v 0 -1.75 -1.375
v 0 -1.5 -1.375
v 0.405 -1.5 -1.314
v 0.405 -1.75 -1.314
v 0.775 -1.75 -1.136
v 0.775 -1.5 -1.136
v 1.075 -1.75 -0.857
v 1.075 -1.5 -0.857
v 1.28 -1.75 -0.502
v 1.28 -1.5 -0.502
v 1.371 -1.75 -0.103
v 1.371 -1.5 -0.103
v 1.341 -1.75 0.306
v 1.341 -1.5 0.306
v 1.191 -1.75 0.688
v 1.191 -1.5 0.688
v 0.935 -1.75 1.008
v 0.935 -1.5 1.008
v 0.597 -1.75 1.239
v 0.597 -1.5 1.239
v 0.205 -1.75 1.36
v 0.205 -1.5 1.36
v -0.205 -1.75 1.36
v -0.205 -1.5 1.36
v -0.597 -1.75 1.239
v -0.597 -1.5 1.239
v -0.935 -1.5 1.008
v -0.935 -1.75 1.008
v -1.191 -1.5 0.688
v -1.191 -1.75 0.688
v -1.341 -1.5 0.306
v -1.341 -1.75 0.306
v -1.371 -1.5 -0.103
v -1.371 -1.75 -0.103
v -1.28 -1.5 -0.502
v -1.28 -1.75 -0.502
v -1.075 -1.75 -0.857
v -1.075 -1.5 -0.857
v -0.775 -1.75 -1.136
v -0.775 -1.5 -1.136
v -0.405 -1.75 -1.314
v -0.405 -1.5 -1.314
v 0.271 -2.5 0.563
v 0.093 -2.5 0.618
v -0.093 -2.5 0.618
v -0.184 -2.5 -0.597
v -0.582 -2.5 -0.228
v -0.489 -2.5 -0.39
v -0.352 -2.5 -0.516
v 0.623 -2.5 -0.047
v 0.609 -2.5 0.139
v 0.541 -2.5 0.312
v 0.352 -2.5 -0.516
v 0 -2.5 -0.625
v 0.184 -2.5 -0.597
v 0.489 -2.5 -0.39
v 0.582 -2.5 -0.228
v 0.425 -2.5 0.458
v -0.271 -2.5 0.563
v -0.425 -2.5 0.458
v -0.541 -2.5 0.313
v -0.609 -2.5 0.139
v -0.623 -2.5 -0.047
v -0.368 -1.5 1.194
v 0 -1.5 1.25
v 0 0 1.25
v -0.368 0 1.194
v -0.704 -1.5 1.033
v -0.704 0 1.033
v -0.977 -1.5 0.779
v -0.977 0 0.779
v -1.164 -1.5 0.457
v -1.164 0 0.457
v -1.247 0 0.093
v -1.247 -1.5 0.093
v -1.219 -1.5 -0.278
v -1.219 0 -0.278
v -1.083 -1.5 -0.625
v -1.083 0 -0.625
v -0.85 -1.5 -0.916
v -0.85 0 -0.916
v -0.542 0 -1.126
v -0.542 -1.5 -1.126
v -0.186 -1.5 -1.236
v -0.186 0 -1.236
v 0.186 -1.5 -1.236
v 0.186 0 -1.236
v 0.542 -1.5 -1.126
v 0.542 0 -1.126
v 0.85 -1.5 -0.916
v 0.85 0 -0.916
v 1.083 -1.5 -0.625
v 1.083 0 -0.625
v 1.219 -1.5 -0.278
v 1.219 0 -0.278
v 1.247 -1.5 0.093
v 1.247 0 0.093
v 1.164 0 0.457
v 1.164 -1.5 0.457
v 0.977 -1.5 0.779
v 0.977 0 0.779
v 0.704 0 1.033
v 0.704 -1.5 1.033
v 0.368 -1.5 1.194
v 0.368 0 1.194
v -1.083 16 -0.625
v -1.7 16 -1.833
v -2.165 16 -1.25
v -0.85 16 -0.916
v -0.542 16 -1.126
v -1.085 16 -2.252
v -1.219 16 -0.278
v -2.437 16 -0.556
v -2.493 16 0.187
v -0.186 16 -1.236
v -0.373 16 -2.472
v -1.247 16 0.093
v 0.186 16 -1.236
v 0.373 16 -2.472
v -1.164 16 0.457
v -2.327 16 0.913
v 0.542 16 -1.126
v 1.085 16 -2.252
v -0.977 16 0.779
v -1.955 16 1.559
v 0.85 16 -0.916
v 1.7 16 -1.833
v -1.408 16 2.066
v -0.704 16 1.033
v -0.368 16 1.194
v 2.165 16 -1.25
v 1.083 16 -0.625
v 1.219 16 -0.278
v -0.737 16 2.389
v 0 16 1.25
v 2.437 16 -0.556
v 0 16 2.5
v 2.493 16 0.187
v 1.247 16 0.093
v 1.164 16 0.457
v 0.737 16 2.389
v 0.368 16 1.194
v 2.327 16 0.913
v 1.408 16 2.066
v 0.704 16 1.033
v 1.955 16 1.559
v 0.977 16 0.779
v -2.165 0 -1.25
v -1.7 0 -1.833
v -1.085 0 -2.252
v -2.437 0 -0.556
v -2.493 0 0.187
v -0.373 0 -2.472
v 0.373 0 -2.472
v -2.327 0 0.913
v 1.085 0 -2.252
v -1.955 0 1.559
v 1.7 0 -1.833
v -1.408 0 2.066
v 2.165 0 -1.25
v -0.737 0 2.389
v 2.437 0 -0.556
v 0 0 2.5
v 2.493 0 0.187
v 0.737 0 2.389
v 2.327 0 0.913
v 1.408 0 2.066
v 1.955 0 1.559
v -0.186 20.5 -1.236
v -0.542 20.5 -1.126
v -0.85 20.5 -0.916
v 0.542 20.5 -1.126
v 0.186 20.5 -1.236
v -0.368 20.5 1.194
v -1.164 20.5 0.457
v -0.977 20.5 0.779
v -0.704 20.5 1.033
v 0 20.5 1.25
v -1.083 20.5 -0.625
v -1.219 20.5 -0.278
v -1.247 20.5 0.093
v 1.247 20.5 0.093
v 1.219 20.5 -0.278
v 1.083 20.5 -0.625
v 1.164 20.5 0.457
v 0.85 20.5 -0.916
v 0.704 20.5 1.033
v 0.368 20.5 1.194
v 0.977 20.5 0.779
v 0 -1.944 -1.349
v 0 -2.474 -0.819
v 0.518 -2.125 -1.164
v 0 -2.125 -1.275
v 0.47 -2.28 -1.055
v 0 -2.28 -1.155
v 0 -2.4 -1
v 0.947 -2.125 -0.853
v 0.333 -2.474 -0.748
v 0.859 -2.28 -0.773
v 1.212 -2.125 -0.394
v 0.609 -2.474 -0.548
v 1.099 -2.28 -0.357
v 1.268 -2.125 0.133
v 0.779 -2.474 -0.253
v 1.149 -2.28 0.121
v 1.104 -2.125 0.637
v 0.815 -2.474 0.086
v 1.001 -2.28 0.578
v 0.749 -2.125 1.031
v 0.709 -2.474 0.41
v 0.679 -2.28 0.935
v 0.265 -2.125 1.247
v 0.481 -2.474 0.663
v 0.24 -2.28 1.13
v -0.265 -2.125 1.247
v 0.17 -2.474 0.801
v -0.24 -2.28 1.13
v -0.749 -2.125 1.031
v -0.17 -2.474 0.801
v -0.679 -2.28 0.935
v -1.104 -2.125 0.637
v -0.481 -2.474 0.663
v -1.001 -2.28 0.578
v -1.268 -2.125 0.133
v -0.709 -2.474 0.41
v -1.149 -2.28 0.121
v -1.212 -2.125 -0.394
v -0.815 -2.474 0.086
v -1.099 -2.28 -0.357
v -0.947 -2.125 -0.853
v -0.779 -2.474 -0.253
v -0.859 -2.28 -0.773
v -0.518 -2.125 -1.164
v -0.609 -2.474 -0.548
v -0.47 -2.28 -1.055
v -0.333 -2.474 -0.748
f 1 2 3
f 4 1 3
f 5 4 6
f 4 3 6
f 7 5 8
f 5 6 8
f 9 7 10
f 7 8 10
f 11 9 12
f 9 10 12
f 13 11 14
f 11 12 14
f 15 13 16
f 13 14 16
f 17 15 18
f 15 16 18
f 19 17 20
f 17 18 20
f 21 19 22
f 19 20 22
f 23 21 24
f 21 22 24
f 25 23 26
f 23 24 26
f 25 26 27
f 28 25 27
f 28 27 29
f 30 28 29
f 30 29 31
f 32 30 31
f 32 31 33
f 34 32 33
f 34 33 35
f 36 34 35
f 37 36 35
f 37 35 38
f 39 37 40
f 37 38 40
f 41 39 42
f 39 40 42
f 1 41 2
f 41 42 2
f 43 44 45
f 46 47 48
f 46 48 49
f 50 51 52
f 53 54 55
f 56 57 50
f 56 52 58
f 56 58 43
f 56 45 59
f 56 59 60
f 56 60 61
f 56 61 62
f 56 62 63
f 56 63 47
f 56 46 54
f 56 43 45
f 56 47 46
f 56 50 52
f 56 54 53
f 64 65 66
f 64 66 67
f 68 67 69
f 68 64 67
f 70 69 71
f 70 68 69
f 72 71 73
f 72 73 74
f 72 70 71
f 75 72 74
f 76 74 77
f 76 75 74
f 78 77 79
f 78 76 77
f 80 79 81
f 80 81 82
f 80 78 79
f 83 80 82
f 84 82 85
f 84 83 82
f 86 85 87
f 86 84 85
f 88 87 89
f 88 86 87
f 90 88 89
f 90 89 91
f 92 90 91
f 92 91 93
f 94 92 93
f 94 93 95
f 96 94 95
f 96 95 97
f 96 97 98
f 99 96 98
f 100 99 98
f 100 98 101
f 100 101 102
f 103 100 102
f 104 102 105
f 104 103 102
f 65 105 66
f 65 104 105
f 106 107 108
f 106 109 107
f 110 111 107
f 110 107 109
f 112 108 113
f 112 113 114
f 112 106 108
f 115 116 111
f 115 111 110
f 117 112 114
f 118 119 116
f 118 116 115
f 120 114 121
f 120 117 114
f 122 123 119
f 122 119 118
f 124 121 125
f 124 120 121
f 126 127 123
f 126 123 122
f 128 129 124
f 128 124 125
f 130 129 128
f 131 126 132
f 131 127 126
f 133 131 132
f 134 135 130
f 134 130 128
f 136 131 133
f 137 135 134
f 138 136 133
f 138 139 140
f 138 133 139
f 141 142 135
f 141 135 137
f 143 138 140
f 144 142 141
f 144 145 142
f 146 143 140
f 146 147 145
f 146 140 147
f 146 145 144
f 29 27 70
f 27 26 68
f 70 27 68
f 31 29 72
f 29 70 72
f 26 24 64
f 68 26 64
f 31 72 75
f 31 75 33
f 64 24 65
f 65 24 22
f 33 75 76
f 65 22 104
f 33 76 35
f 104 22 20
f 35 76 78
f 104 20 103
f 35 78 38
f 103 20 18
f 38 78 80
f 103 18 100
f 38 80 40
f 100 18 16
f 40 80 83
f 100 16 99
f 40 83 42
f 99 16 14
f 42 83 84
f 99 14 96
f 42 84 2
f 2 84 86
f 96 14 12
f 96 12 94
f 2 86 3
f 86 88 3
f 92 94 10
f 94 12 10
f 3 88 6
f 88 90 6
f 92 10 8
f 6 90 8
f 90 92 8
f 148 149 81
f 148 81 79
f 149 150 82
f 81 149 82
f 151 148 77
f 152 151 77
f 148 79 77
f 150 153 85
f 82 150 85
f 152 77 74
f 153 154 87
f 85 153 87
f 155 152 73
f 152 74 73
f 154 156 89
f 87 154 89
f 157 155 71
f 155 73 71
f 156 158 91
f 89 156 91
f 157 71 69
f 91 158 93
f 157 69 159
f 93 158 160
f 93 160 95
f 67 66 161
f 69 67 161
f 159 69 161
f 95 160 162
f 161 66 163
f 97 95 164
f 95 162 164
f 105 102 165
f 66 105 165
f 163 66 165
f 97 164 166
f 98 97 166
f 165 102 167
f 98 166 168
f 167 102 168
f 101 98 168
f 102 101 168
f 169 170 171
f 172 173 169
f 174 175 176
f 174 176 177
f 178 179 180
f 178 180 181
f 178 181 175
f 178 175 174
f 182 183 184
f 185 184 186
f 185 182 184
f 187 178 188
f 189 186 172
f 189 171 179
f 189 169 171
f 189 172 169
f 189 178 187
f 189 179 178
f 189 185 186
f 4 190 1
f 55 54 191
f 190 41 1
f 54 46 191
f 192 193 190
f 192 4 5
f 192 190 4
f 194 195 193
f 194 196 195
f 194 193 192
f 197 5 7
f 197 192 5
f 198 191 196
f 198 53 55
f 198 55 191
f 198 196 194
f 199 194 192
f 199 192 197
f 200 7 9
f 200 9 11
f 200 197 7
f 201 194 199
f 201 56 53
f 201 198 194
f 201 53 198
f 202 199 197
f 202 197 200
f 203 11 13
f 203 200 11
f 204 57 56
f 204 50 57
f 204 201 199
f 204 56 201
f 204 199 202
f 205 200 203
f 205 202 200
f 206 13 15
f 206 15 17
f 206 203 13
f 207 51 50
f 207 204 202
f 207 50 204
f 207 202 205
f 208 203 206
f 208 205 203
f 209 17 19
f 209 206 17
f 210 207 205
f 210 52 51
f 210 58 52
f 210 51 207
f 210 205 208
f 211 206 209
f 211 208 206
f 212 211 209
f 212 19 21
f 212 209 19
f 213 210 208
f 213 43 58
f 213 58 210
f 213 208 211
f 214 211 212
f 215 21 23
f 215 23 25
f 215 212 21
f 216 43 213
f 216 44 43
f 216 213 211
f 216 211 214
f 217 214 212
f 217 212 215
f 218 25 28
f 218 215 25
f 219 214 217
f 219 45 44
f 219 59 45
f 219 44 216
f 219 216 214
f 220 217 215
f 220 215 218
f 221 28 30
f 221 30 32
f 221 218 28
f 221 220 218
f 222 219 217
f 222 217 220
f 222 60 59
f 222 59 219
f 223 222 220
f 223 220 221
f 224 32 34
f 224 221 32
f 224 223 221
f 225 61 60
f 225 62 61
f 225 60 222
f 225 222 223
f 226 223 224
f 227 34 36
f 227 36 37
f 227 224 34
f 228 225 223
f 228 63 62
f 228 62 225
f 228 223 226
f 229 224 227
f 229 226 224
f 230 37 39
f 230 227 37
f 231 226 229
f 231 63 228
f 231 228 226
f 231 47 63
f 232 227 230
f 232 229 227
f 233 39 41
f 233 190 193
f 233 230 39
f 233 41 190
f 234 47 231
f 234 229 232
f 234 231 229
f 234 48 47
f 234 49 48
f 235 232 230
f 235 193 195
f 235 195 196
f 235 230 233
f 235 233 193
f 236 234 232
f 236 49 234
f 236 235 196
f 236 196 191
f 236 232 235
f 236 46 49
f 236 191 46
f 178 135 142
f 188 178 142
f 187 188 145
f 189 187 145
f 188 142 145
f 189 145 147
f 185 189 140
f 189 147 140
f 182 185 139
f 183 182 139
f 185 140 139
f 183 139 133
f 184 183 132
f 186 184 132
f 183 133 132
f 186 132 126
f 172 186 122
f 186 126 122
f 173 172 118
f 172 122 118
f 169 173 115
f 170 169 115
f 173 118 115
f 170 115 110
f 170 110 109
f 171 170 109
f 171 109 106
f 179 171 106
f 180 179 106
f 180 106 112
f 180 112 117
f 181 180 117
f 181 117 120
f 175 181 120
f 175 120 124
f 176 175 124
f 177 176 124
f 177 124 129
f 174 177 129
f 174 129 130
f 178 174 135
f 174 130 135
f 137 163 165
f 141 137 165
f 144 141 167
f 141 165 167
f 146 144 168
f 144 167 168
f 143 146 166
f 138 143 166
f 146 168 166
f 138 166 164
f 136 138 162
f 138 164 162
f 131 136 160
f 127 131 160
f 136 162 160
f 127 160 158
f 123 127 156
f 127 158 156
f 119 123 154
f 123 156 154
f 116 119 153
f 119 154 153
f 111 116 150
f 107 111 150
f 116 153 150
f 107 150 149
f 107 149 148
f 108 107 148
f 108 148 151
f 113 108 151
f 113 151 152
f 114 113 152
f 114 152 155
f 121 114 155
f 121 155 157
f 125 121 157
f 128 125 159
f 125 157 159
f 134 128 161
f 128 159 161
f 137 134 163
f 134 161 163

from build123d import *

# Parameters (mm, degrees)
SKETCH1_R           = 2.5
BOSS_EXTRUDE1_DEPTH = 16
SKETCH2_R           = 1.25
BOSS_EXTRUDE2_DEPTH = 4.5
BOSS_EXTRUDE3_START = 1.5
SKETCH3_R           = 1.25
BOSS_EXTRUDE3_DEPTH = 1.5
SKETCH4_R           = 1.375
BOSS_EXTRUDE4_DEPTH = 1
FILLET1_R           = 0.75


with BuildPart() as part:
    # Sketch1 → Boss-Extrude1 (new body)
    with BuildSketch(Plane(origin=(0, 0, 0), x_dir=(1, 0, 0), z_dir=(0, 1, 0))):
        with Locations(Location((0, 0, 0), (0, 0, 270))):
            Circle(SKETCH1_R)
    extrude(amount=BOSS_EXTRUDE1_DEPTH)

    # Sketch2 → Boss-Extrude2 (add)
    with BuildSketch(Plane(origin=(0, 16, 0), x_dir=(1, 0, 0), z_dir=(0, 1, 0))):
        with Locations(Location((0, 0, 0), (0, 0, 270))):
            Circle(SKETCH2_R)
    extrude(amount=BOSS_EXTRUDE2_DEPTH)

    # Sketch3 → Boss-Extrude3 (add)
    with BuildSketch(Plane(origin=(0, 0, 0), x_dir=(-1, 0, 0), z_dir=(0, -1, 0)).offset(BOSS_EXTRUDE3_START)):
        with Locations(Location((0, 0, 0), (0, 0, 270))):
            Circle(SKETCH3_R)
    extrude(amount=-BOSS_EXTRUDE3_DEPTH)

    # Sketch4 → Boss-Extrude4 (add)
    with BuildSketch(Plane(origin=(0, -1.5, 0), x_dir=(-1, 0, 0), z_dir=(0, -1, 0))):
        with Locations(Location((0, 0, 0), (0, 0, 90))):
            Circle(SKETCH4_R)
    extrude(amount=BOSS_EXTRUDE4_DEPTH)

    # Fillet1
    fillet1_edges = [part.edges().sort_by_distance(p)[0] for p in [
        (0, -2.5, 1.375),
    ]]
    fillet(fillet1_edges, radius=FILLET1_R)


solid = part.part
